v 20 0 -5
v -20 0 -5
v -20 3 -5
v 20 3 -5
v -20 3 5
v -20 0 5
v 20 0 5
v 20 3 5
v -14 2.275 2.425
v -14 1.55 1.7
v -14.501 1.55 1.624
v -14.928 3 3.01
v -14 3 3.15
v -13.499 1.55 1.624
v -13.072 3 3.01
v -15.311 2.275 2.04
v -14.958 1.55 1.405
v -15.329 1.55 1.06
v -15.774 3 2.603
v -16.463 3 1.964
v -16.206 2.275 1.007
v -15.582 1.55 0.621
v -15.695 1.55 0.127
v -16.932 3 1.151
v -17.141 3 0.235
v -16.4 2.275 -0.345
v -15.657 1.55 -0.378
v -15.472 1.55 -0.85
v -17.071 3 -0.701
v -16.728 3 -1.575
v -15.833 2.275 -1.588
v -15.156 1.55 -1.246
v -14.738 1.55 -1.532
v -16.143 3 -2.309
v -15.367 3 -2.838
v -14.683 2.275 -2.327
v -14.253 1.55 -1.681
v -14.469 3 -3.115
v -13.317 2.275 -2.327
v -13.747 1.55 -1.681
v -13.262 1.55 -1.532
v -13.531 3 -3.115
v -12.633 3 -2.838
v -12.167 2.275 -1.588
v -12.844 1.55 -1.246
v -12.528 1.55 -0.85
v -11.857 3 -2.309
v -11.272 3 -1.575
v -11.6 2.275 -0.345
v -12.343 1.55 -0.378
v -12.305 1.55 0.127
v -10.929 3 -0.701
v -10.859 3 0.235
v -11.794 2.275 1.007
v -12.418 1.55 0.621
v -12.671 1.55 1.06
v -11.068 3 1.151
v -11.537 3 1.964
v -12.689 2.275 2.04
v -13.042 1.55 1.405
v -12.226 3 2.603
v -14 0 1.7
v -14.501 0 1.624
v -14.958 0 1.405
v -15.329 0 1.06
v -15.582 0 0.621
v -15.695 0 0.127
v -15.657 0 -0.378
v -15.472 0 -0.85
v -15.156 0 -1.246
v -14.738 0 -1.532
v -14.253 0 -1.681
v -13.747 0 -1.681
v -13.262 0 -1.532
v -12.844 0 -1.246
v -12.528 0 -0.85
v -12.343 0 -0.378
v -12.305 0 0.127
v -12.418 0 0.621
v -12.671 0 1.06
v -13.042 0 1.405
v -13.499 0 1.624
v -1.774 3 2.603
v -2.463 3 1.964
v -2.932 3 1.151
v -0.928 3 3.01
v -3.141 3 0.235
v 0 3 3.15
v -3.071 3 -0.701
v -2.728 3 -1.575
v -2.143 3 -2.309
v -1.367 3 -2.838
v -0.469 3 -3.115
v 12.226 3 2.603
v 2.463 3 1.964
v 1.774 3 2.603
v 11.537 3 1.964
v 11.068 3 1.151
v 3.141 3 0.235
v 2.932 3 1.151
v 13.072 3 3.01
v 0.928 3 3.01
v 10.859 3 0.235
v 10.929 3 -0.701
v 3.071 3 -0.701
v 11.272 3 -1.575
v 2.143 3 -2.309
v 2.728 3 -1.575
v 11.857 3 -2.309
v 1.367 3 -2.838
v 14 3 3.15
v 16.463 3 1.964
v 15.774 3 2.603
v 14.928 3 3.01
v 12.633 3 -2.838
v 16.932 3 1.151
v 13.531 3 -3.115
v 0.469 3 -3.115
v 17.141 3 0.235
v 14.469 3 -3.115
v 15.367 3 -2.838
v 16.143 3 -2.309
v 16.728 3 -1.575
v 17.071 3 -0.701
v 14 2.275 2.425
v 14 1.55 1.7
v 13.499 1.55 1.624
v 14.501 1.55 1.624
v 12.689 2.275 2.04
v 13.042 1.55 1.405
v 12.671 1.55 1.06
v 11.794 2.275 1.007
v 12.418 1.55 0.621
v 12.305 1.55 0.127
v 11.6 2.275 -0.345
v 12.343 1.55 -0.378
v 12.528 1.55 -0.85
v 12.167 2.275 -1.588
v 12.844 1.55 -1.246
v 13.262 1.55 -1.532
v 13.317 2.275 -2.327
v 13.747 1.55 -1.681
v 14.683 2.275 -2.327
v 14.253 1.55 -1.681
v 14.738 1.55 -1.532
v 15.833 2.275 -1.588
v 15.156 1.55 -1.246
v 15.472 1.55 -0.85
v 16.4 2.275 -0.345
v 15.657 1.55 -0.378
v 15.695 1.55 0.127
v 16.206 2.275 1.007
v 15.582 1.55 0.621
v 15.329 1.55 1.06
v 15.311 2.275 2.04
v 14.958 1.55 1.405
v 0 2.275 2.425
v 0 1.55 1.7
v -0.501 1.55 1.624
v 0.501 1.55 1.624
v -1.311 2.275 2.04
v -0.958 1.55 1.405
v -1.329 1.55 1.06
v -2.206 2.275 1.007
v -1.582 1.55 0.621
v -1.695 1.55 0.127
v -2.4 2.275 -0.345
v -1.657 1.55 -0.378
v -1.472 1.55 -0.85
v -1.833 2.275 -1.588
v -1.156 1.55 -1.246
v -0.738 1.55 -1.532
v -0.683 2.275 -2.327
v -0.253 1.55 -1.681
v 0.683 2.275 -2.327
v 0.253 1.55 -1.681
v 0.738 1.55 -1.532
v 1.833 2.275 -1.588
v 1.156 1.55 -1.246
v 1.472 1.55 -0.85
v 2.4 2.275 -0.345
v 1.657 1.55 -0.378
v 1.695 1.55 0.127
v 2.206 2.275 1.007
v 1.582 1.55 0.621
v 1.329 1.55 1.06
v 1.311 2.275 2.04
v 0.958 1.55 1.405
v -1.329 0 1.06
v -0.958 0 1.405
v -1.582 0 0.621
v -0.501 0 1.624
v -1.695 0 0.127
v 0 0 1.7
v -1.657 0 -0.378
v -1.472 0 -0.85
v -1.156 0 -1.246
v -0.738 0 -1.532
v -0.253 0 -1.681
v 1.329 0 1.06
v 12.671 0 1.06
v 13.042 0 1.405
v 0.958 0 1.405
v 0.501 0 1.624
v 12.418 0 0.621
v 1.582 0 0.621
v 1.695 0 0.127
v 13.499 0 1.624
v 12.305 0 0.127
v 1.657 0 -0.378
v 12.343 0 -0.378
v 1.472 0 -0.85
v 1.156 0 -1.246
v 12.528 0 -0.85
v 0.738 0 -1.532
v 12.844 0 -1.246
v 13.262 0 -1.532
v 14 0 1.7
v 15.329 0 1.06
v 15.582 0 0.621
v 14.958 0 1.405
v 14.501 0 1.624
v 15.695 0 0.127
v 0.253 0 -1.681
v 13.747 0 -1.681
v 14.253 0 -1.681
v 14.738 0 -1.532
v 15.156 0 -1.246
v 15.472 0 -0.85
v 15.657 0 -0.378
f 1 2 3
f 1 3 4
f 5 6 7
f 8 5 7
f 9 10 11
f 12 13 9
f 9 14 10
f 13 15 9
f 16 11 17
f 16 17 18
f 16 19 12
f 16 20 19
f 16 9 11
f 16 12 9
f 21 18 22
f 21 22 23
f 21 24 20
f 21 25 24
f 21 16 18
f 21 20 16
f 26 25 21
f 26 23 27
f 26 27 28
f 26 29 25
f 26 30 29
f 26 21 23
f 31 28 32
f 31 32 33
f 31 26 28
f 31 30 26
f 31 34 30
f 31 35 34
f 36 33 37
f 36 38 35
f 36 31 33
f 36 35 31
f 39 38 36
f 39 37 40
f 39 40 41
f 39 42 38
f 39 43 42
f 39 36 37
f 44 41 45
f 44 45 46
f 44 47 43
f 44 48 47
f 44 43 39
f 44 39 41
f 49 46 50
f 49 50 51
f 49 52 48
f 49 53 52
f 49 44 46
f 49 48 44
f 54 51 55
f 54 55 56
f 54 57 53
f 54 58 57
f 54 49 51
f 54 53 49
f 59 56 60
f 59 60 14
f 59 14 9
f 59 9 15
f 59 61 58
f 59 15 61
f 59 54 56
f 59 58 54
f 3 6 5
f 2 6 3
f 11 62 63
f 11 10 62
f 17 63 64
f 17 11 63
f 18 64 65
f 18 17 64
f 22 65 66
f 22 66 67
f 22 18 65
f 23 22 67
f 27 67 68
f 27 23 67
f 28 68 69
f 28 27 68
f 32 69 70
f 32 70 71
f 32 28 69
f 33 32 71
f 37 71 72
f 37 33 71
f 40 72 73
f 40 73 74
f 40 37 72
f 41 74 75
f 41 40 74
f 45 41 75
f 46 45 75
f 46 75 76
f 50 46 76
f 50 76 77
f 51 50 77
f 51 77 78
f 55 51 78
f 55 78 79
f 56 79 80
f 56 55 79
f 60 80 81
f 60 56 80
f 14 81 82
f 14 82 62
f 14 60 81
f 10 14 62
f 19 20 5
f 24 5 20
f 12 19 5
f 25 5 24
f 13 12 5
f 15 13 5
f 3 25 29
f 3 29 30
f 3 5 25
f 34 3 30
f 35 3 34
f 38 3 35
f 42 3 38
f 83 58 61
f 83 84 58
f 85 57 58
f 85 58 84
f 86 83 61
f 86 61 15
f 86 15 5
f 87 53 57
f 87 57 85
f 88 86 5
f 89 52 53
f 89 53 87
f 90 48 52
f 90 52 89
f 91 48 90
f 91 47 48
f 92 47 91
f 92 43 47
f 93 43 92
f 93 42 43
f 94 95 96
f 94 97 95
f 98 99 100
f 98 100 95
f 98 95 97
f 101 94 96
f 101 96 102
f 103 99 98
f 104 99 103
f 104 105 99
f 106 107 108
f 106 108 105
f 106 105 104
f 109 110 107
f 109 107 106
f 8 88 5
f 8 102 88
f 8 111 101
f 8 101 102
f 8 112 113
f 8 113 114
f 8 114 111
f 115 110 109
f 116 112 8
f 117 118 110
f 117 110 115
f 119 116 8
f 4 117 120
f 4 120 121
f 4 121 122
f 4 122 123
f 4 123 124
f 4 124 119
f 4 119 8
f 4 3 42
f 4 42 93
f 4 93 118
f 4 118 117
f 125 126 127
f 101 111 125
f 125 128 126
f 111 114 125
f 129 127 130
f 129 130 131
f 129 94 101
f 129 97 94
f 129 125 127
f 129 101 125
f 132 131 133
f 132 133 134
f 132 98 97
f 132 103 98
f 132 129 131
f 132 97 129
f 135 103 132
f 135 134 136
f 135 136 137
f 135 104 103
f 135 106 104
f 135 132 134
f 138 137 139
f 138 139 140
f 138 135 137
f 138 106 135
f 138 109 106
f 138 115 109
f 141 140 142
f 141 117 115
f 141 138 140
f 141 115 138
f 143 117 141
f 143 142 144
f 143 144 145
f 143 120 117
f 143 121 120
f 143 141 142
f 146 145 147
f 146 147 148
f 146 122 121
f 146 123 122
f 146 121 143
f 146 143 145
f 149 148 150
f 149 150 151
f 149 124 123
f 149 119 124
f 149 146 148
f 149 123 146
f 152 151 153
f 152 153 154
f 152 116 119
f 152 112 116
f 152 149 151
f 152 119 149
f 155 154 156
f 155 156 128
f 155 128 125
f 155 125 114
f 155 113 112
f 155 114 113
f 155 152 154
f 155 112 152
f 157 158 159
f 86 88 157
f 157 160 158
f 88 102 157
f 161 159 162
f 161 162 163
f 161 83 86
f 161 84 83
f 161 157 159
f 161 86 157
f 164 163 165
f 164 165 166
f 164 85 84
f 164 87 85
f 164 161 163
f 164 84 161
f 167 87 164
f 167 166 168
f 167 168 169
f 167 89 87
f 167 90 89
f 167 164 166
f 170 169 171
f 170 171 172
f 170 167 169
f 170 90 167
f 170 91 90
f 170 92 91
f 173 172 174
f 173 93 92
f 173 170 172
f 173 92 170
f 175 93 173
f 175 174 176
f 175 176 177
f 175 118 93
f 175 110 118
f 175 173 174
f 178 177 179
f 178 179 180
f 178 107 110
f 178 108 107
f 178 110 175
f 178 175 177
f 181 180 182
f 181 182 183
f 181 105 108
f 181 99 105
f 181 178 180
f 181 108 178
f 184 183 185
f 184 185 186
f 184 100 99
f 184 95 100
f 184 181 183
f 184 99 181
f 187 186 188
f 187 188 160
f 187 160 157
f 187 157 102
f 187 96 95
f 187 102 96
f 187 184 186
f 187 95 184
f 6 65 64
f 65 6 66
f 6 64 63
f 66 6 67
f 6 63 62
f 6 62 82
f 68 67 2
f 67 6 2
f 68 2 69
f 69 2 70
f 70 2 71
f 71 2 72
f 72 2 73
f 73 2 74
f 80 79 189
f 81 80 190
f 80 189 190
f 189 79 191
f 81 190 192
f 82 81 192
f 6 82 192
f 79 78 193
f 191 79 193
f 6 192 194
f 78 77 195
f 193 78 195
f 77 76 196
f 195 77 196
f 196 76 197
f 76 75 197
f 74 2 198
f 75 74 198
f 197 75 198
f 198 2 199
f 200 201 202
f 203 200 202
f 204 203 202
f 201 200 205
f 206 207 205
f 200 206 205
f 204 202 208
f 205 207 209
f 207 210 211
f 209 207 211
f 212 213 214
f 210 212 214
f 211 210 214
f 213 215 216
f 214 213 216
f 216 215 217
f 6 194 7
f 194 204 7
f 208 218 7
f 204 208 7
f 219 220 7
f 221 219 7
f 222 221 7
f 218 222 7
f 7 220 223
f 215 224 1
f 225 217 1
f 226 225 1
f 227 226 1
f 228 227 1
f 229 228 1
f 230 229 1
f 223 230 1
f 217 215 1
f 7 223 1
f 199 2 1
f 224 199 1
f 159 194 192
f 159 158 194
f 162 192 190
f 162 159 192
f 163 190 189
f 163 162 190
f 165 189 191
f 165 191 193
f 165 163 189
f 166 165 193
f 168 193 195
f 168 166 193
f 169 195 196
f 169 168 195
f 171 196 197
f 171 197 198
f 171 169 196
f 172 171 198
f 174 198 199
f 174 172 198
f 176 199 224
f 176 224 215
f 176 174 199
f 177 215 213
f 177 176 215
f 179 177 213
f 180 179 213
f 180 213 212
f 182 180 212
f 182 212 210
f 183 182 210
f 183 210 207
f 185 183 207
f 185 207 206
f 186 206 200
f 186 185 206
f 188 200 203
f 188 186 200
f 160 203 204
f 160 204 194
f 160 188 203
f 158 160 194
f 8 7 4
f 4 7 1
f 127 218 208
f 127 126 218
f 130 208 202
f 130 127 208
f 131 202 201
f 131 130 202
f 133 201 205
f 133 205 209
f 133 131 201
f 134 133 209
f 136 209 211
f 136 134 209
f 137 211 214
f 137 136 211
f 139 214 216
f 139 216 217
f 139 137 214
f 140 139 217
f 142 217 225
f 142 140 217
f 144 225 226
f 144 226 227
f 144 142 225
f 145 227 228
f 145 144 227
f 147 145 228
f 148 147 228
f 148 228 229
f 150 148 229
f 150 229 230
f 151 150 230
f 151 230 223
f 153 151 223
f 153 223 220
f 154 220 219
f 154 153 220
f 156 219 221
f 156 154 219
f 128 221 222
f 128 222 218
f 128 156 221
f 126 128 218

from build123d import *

# Parameters (mm, degrees)
SKETCH1_W                                    = 40
SKETCH1_H                                    = 10
BOSS_EXTRUDE1_DEPTH                          = 3
CSK_FOR_M3_COUNTERSUNK_FLAT_HEAD_SCR_2_COUNT = 2
CSK_FOR_M3_COUNTERSUNK_FLAT_HEAD_SCR_2_PITCH = 28
CSK_FOR_M3_COUNTERSUNK_FLAT_HEAD_SCR_3_COUNT = 2
CSK_FOR_M3_COUNTERSUNK_FLAT_HEAD_SCR_3_PITCH = 14


with BuildPart() as part:
    # Sketch1 → Boss-Extrude1 (new body)
    with BuildSketch(Plane(origin=(0, 0, 0), x_dir=(1, 0, 0), z_dir=(0, 1, 0))):
        Rectangle(SKETCH1_W, SKETCH1_H)
    extrude(amount=BOSS_EXTRUDE1_DEPTH)

    # Sketch3 → CSK for M3 Countersunk Flat Head Screw1 (revolve, cut)
    with BuildSketch(Plane(origin=(-14, 3, 0), x_dir=(0, 0, 1), z_dir=(1, 0, 0))):
        Polygon((0, 0), (0, 3), (1.7, 3), (1.7, 1.45), (3.15, 0), align=None)
    csk_for_m3_countersunk_flat_head_screw1 = revolve(axis=Axis((-14, 9.35, 0), (0, -1, 0)), mode=Mode.SUBTRACT)

    # CSK for M3 Countersunk Flat Head Scr 2: CSK for M3 Countersunk Flat Head Screw1 ×2
    with Locations(*[(i * CSK_FOR_M3_COUNTERSUNK_FLAT_HEAD_SCR_2_PITCH, 0, 0) for i in range(1, CSK_FOR_M3_COUNTERSUNK_FLAT_HEAD_SCR_2_COUNT)]):
        add(csk_for_m3_countersunk_flat_head_screw1, mode=Mode.SUBTRACT)

    # CSK for M3 Countersunk Flat Head Scr 3: CSK for M3 Countersunk Flat Head Screw1 ×2
    with Locations(*[(i * CSK_FOR_M3_COUNTERSUNK_FLAT_HEAD_SCR_3_PITCH, 0, 0) for i in range(1, CSK_FOR_M3_COUNTERSUNK_FLAT_HEAD_SCR_3_COUNT)]):
        add(csk_for_m3_countersunk_flat_head_screw1, mode=Mode.SUBTRACT)


solid = part.part
